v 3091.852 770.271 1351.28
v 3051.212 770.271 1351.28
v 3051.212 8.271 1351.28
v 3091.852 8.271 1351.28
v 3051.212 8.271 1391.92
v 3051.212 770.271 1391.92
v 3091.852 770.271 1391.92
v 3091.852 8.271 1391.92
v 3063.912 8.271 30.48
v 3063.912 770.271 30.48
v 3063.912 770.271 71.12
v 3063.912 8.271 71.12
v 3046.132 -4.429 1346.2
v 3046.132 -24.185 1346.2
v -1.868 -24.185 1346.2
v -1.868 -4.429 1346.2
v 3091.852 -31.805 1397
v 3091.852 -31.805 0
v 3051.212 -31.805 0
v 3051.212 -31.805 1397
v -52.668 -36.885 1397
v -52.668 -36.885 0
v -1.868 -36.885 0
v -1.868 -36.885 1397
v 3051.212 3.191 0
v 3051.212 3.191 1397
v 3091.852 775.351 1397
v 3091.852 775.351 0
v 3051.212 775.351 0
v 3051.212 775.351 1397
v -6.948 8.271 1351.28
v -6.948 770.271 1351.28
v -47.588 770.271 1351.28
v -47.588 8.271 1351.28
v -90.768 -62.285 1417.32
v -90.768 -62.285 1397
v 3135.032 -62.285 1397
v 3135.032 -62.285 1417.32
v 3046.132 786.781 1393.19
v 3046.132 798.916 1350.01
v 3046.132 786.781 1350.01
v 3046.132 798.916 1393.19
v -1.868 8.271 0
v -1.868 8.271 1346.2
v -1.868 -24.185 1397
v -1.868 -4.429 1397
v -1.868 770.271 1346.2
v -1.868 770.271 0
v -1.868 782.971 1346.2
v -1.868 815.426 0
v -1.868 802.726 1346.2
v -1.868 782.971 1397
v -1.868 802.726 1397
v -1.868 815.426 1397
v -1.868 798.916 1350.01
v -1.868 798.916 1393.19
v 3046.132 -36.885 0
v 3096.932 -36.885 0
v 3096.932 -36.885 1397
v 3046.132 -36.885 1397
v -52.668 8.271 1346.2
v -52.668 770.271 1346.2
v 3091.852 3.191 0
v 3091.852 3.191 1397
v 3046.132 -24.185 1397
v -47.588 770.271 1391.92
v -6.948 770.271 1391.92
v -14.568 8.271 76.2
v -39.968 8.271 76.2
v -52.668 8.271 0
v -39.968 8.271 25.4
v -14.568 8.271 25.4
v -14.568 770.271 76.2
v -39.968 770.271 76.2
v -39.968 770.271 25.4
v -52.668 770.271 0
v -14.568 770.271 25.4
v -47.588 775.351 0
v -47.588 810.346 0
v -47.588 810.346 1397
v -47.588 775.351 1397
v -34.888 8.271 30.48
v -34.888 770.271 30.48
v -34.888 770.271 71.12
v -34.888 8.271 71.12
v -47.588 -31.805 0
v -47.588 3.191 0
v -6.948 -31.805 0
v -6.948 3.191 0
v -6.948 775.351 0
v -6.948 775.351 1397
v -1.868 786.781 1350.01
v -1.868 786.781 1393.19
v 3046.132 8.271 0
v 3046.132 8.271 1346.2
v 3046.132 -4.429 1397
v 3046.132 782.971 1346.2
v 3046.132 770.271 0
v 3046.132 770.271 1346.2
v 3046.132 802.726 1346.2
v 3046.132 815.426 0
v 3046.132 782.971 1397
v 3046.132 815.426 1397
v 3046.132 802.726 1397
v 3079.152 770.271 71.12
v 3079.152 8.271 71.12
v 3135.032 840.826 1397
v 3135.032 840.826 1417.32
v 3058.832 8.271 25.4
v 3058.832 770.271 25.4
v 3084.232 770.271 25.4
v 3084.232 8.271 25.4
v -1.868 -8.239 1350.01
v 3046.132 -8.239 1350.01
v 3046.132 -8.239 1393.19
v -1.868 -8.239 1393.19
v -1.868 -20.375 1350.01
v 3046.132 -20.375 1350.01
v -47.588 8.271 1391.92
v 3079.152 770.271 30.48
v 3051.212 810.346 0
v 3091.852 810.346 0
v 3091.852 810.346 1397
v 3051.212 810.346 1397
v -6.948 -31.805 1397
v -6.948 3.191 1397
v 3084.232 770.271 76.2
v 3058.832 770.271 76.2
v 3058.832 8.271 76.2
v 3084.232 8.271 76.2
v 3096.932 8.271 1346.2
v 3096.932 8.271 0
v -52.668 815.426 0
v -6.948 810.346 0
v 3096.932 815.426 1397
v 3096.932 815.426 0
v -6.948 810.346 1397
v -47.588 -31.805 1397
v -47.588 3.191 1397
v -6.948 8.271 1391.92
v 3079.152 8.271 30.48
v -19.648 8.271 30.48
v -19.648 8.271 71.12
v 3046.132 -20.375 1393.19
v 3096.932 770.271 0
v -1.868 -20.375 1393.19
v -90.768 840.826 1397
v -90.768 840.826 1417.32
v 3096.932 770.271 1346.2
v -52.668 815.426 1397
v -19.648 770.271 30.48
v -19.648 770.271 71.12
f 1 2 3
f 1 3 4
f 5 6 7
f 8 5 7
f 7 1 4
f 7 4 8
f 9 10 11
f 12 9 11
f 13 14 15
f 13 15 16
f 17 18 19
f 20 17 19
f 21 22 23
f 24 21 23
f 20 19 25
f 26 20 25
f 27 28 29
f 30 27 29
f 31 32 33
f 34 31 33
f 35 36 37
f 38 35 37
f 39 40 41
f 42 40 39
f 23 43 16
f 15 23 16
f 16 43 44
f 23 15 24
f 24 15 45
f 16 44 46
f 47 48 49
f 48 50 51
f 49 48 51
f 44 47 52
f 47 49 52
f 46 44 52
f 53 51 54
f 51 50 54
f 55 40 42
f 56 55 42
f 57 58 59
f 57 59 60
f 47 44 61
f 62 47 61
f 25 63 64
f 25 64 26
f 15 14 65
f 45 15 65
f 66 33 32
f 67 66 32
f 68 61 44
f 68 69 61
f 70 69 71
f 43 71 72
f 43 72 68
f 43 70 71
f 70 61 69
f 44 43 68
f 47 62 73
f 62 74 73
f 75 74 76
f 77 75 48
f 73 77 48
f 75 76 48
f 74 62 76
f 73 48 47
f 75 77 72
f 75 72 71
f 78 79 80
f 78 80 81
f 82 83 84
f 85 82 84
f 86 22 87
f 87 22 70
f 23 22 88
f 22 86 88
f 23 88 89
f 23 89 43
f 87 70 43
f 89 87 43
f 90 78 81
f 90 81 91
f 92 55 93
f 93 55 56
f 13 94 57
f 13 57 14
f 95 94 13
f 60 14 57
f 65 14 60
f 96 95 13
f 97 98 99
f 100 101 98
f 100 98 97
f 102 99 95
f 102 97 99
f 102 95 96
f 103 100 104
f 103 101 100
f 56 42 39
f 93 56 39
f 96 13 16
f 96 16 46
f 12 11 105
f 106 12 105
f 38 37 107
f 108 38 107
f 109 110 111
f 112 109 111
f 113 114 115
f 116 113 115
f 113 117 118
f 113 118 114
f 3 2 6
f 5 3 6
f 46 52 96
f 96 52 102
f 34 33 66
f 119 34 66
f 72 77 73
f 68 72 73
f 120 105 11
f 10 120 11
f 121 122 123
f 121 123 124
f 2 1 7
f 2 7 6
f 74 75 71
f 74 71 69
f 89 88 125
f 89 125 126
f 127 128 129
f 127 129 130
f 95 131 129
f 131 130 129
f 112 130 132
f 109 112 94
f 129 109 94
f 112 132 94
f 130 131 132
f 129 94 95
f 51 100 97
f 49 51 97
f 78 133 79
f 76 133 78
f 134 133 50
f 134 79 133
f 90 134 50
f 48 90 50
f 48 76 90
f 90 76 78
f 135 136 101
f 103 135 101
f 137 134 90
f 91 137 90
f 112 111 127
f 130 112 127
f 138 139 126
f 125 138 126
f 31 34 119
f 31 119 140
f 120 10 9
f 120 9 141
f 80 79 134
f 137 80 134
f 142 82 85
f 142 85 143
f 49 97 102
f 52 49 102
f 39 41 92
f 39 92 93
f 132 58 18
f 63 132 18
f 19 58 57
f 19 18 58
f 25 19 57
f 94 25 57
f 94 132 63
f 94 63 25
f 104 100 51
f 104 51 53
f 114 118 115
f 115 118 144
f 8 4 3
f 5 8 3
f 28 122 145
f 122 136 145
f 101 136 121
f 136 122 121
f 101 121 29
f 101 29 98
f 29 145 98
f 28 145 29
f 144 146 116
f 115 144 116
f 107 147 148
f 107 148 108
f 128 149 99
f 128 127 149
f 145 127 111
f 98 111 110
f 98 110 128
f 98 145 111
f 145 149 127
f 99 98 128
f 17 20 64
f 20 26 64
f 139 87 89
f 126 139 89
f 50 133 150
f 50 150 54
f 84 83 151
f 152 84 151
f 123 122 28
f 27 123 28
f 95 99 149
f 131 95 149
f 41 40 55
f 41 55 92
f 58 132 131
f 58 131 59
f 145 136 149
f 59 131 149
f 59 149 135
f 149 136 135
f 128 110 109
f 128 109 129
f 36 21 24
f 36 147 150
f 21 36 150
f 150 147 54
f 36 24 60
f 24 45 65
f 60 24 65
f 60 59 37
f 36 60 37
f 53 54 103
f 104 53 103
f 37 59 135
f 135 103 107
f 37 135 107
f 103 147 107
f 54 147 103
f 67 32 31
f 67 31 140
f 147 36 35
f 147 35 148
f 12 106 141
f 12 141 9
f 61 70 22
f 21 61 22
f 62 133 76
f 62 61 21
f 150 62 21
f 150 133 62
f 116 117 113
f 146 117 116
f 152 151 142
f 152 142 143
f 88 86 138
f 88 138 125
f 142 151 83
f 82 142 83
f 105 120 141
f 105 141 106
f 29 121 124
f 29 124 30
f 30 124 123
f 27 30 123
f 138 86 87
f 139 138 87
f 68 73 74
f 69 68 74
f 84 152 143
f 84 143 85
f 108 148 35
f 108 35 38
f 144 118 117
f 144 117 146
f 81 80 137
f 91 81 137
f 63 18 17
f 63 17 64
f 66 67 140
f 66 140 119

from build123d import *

# Parameters (mm, degrees)
F0_W     = 50.8
F0_H     = 45.1555665885
F0_W_2   = 40.64
F0_H_2   = 34.9955665885
F1_DEPTH = 1397
F2_W     = 25.4
F2_H     = 50.8
F2_W_2   = 15.24
F2_H_2   = 40.64
F2_W_3   = 50.8
F2_W_4   = 40.64
F3_DEPTH = 381
F4_W     = 19.7555665885
F4_H     = 50.8
F4_W_2   = 12.1355665885
F4_H_2   = 43.18
F5_DEPTH = 1524
F8_W     = 3225.8
F8_H     = 903.1111331769
F8_W_2   = 40.64
F8_H_2   = 34.9955665885
F8_W_3   = 3048
F8_H_3   = 787.4
F9_DEPTH = 20.32


with BuildPart() as f1:
    # F0 (on Top) → F1 (new body)
    with BuildSketch(Plane.XY):
        with Locations((-27.2679795849, -14.3071769268)):
            Rectangle(F0_W, F0_H)
        with Locations((-27.2679795849, -14.3071769268)):
            Rectangle(F0_W_2, F0_H_2, mode=Mode.SUBTRACT)
    extrude(amount=F1_DEPTH)

    # F2 (on face) → F3 (join)
    with BuildSketch(Plane(origin=(0, 8.2706063674, 0), x_dir=(-1, 0, 0), z_dir=(0, 1, 0))):
        with Locations((27.2679795849, 50.8)):
            Rectangle(F2_W, F2_H)
        with Locations((27.2679795849, 50.8)):
            Rectangle(F2_W_2, F2_H_2, mode=Mode.SUBTRACT)
        with Locations((27.2679795849, 1371.6)):
            Rectangle(F2_W_3, F2_H)
        with Locations((27.2679795849, 1371.6)):
            Rectangle(F2_W_4, F2_H_2, mode=Mode.SUBTRACT)
    extrude(amount=F3_DEPTH)

    # F4 (on face) → F5 (join)
    with BuildSketch(Plane.YZ.offset(-1.8679795849)):
        with Locations((-14.3071769268, 1371.6)):
            Rectangle(F4_W, F4_H)
        with Locations((-14.3071769268, 1371.6)):
            Rectangle(F4_W_2, F4_H_2, mode=Mode.SUBTRACT)
    extrude(amount=F5_DEPTH)

    # F6: F1 across face


with BuildPart() as f1_1:
    add(f1.part)
    add(f1.part.mirror(Plane(origin=(1522.1320204151, -14.3071769268, 1371.6), x_dir=(0, 1, 0), z_dir=(1, 0, 0))))

    # F7: F1 across face


with BuildPart() as f1_2:
    add(f1_1.part)
    add(f1_1.part.mirror(Plane(origin=(-27.2679795849, 389.2706063674, 1371.6), x_dir=(-1, 0, 0), z_dir=(0, 1, 0))))

    # F8 (on face) → F9 (join)
    with BuildSketch(Plane.XY.offset(1397)):
        with Locations((1522.1320204151, 389.2706063674)):
            Rectangle(F8_W, F8_H)
        Polygon((-52.6679795849, -36.8849602211), (-52.6679795849, 815.4261729559), (-1.8679795849, 815.4261729559), (-1.8679795849, 802.7261729559), (3046.1320204151, 802.7261729559), (3046.1320204151, 815.4261729559), (3096.9320204151, 815.4261729559), (3096.9320204151, -36.8849602211), (3046.1320204151, -36.8849602211), (3046.1320204151, -24.1849602211), (-1.8679795849, -24.1849602211), (-1.8679795849, -36.8849602211), align=None, mode=Mode.SUBTRACT)
        Polygon((-1.8679795849, 815.4261729559), (-52.6679795849, 815.4261729559), (-52.6679795849, -36.8849602211), (-1.8679795849, -36.8849602211), (-1.8679795849, -24.1849602211), (3046.1320204151, -24.1849602211), (3046.1320204151, -36.8849602211), (3096.9320204151, -36.8849602211), (3096.9320204151, 815.4261729559), (3046.1320204151, 815.4261729559), (3046.1320204151, 802.7261729559), (-1.8679795849, 802.7261729559), align=None)
        with Locations((-27.2679795849, -14.3071769268)):
            Rectangle(F8_W_2, F8_H_2, mode=Mode.SUBTRACT)
        with Locations((3071.5320204151, -14.3071769268)):
            Rectangle(F8_W_2, F8_H_2, mode=Mode.SUBTRACT)
        with Locations((1522.1320204151, 389.2706063674)):
            Rectangle(F8_W_3, F8_H_3, mode=Mode.SUBTRACT)
        with Locations((-27.2679795849, 792.8483896616)):
            Rectangle(F8_W_2, F8_H_2, mode=Mode.SUBTRACT)
        with Locations((3071.5320204151, 792.8483896616)):
            Rectangle(F8_W_2, F8_H_2, mode=Mode.SUBTRACT)
        with Locations((1522.1320204151, 389.2706063674)):
            Rectangle(F8_W_3, F8_H_3)
        with Locations((-27.2679795849, -14.3071769268)):
            Rectangle(F8_W_2, F8_H_2)
        with Locations((3071.5320204151, -14.3071769268)):
            Rectangle(F8_W_2, F8_H_2)
        with Locations((3071.5320204151, 792.8483896616)):
            Rectangle(F8_W_2, F8_H_2)
        with Locations((-27.2679795849, 792.8483896616)):
            Rectangle(F8_W_2, F8_H_2)
    extrude(amount=F9_DEPTH)


solid = f1_2.part
